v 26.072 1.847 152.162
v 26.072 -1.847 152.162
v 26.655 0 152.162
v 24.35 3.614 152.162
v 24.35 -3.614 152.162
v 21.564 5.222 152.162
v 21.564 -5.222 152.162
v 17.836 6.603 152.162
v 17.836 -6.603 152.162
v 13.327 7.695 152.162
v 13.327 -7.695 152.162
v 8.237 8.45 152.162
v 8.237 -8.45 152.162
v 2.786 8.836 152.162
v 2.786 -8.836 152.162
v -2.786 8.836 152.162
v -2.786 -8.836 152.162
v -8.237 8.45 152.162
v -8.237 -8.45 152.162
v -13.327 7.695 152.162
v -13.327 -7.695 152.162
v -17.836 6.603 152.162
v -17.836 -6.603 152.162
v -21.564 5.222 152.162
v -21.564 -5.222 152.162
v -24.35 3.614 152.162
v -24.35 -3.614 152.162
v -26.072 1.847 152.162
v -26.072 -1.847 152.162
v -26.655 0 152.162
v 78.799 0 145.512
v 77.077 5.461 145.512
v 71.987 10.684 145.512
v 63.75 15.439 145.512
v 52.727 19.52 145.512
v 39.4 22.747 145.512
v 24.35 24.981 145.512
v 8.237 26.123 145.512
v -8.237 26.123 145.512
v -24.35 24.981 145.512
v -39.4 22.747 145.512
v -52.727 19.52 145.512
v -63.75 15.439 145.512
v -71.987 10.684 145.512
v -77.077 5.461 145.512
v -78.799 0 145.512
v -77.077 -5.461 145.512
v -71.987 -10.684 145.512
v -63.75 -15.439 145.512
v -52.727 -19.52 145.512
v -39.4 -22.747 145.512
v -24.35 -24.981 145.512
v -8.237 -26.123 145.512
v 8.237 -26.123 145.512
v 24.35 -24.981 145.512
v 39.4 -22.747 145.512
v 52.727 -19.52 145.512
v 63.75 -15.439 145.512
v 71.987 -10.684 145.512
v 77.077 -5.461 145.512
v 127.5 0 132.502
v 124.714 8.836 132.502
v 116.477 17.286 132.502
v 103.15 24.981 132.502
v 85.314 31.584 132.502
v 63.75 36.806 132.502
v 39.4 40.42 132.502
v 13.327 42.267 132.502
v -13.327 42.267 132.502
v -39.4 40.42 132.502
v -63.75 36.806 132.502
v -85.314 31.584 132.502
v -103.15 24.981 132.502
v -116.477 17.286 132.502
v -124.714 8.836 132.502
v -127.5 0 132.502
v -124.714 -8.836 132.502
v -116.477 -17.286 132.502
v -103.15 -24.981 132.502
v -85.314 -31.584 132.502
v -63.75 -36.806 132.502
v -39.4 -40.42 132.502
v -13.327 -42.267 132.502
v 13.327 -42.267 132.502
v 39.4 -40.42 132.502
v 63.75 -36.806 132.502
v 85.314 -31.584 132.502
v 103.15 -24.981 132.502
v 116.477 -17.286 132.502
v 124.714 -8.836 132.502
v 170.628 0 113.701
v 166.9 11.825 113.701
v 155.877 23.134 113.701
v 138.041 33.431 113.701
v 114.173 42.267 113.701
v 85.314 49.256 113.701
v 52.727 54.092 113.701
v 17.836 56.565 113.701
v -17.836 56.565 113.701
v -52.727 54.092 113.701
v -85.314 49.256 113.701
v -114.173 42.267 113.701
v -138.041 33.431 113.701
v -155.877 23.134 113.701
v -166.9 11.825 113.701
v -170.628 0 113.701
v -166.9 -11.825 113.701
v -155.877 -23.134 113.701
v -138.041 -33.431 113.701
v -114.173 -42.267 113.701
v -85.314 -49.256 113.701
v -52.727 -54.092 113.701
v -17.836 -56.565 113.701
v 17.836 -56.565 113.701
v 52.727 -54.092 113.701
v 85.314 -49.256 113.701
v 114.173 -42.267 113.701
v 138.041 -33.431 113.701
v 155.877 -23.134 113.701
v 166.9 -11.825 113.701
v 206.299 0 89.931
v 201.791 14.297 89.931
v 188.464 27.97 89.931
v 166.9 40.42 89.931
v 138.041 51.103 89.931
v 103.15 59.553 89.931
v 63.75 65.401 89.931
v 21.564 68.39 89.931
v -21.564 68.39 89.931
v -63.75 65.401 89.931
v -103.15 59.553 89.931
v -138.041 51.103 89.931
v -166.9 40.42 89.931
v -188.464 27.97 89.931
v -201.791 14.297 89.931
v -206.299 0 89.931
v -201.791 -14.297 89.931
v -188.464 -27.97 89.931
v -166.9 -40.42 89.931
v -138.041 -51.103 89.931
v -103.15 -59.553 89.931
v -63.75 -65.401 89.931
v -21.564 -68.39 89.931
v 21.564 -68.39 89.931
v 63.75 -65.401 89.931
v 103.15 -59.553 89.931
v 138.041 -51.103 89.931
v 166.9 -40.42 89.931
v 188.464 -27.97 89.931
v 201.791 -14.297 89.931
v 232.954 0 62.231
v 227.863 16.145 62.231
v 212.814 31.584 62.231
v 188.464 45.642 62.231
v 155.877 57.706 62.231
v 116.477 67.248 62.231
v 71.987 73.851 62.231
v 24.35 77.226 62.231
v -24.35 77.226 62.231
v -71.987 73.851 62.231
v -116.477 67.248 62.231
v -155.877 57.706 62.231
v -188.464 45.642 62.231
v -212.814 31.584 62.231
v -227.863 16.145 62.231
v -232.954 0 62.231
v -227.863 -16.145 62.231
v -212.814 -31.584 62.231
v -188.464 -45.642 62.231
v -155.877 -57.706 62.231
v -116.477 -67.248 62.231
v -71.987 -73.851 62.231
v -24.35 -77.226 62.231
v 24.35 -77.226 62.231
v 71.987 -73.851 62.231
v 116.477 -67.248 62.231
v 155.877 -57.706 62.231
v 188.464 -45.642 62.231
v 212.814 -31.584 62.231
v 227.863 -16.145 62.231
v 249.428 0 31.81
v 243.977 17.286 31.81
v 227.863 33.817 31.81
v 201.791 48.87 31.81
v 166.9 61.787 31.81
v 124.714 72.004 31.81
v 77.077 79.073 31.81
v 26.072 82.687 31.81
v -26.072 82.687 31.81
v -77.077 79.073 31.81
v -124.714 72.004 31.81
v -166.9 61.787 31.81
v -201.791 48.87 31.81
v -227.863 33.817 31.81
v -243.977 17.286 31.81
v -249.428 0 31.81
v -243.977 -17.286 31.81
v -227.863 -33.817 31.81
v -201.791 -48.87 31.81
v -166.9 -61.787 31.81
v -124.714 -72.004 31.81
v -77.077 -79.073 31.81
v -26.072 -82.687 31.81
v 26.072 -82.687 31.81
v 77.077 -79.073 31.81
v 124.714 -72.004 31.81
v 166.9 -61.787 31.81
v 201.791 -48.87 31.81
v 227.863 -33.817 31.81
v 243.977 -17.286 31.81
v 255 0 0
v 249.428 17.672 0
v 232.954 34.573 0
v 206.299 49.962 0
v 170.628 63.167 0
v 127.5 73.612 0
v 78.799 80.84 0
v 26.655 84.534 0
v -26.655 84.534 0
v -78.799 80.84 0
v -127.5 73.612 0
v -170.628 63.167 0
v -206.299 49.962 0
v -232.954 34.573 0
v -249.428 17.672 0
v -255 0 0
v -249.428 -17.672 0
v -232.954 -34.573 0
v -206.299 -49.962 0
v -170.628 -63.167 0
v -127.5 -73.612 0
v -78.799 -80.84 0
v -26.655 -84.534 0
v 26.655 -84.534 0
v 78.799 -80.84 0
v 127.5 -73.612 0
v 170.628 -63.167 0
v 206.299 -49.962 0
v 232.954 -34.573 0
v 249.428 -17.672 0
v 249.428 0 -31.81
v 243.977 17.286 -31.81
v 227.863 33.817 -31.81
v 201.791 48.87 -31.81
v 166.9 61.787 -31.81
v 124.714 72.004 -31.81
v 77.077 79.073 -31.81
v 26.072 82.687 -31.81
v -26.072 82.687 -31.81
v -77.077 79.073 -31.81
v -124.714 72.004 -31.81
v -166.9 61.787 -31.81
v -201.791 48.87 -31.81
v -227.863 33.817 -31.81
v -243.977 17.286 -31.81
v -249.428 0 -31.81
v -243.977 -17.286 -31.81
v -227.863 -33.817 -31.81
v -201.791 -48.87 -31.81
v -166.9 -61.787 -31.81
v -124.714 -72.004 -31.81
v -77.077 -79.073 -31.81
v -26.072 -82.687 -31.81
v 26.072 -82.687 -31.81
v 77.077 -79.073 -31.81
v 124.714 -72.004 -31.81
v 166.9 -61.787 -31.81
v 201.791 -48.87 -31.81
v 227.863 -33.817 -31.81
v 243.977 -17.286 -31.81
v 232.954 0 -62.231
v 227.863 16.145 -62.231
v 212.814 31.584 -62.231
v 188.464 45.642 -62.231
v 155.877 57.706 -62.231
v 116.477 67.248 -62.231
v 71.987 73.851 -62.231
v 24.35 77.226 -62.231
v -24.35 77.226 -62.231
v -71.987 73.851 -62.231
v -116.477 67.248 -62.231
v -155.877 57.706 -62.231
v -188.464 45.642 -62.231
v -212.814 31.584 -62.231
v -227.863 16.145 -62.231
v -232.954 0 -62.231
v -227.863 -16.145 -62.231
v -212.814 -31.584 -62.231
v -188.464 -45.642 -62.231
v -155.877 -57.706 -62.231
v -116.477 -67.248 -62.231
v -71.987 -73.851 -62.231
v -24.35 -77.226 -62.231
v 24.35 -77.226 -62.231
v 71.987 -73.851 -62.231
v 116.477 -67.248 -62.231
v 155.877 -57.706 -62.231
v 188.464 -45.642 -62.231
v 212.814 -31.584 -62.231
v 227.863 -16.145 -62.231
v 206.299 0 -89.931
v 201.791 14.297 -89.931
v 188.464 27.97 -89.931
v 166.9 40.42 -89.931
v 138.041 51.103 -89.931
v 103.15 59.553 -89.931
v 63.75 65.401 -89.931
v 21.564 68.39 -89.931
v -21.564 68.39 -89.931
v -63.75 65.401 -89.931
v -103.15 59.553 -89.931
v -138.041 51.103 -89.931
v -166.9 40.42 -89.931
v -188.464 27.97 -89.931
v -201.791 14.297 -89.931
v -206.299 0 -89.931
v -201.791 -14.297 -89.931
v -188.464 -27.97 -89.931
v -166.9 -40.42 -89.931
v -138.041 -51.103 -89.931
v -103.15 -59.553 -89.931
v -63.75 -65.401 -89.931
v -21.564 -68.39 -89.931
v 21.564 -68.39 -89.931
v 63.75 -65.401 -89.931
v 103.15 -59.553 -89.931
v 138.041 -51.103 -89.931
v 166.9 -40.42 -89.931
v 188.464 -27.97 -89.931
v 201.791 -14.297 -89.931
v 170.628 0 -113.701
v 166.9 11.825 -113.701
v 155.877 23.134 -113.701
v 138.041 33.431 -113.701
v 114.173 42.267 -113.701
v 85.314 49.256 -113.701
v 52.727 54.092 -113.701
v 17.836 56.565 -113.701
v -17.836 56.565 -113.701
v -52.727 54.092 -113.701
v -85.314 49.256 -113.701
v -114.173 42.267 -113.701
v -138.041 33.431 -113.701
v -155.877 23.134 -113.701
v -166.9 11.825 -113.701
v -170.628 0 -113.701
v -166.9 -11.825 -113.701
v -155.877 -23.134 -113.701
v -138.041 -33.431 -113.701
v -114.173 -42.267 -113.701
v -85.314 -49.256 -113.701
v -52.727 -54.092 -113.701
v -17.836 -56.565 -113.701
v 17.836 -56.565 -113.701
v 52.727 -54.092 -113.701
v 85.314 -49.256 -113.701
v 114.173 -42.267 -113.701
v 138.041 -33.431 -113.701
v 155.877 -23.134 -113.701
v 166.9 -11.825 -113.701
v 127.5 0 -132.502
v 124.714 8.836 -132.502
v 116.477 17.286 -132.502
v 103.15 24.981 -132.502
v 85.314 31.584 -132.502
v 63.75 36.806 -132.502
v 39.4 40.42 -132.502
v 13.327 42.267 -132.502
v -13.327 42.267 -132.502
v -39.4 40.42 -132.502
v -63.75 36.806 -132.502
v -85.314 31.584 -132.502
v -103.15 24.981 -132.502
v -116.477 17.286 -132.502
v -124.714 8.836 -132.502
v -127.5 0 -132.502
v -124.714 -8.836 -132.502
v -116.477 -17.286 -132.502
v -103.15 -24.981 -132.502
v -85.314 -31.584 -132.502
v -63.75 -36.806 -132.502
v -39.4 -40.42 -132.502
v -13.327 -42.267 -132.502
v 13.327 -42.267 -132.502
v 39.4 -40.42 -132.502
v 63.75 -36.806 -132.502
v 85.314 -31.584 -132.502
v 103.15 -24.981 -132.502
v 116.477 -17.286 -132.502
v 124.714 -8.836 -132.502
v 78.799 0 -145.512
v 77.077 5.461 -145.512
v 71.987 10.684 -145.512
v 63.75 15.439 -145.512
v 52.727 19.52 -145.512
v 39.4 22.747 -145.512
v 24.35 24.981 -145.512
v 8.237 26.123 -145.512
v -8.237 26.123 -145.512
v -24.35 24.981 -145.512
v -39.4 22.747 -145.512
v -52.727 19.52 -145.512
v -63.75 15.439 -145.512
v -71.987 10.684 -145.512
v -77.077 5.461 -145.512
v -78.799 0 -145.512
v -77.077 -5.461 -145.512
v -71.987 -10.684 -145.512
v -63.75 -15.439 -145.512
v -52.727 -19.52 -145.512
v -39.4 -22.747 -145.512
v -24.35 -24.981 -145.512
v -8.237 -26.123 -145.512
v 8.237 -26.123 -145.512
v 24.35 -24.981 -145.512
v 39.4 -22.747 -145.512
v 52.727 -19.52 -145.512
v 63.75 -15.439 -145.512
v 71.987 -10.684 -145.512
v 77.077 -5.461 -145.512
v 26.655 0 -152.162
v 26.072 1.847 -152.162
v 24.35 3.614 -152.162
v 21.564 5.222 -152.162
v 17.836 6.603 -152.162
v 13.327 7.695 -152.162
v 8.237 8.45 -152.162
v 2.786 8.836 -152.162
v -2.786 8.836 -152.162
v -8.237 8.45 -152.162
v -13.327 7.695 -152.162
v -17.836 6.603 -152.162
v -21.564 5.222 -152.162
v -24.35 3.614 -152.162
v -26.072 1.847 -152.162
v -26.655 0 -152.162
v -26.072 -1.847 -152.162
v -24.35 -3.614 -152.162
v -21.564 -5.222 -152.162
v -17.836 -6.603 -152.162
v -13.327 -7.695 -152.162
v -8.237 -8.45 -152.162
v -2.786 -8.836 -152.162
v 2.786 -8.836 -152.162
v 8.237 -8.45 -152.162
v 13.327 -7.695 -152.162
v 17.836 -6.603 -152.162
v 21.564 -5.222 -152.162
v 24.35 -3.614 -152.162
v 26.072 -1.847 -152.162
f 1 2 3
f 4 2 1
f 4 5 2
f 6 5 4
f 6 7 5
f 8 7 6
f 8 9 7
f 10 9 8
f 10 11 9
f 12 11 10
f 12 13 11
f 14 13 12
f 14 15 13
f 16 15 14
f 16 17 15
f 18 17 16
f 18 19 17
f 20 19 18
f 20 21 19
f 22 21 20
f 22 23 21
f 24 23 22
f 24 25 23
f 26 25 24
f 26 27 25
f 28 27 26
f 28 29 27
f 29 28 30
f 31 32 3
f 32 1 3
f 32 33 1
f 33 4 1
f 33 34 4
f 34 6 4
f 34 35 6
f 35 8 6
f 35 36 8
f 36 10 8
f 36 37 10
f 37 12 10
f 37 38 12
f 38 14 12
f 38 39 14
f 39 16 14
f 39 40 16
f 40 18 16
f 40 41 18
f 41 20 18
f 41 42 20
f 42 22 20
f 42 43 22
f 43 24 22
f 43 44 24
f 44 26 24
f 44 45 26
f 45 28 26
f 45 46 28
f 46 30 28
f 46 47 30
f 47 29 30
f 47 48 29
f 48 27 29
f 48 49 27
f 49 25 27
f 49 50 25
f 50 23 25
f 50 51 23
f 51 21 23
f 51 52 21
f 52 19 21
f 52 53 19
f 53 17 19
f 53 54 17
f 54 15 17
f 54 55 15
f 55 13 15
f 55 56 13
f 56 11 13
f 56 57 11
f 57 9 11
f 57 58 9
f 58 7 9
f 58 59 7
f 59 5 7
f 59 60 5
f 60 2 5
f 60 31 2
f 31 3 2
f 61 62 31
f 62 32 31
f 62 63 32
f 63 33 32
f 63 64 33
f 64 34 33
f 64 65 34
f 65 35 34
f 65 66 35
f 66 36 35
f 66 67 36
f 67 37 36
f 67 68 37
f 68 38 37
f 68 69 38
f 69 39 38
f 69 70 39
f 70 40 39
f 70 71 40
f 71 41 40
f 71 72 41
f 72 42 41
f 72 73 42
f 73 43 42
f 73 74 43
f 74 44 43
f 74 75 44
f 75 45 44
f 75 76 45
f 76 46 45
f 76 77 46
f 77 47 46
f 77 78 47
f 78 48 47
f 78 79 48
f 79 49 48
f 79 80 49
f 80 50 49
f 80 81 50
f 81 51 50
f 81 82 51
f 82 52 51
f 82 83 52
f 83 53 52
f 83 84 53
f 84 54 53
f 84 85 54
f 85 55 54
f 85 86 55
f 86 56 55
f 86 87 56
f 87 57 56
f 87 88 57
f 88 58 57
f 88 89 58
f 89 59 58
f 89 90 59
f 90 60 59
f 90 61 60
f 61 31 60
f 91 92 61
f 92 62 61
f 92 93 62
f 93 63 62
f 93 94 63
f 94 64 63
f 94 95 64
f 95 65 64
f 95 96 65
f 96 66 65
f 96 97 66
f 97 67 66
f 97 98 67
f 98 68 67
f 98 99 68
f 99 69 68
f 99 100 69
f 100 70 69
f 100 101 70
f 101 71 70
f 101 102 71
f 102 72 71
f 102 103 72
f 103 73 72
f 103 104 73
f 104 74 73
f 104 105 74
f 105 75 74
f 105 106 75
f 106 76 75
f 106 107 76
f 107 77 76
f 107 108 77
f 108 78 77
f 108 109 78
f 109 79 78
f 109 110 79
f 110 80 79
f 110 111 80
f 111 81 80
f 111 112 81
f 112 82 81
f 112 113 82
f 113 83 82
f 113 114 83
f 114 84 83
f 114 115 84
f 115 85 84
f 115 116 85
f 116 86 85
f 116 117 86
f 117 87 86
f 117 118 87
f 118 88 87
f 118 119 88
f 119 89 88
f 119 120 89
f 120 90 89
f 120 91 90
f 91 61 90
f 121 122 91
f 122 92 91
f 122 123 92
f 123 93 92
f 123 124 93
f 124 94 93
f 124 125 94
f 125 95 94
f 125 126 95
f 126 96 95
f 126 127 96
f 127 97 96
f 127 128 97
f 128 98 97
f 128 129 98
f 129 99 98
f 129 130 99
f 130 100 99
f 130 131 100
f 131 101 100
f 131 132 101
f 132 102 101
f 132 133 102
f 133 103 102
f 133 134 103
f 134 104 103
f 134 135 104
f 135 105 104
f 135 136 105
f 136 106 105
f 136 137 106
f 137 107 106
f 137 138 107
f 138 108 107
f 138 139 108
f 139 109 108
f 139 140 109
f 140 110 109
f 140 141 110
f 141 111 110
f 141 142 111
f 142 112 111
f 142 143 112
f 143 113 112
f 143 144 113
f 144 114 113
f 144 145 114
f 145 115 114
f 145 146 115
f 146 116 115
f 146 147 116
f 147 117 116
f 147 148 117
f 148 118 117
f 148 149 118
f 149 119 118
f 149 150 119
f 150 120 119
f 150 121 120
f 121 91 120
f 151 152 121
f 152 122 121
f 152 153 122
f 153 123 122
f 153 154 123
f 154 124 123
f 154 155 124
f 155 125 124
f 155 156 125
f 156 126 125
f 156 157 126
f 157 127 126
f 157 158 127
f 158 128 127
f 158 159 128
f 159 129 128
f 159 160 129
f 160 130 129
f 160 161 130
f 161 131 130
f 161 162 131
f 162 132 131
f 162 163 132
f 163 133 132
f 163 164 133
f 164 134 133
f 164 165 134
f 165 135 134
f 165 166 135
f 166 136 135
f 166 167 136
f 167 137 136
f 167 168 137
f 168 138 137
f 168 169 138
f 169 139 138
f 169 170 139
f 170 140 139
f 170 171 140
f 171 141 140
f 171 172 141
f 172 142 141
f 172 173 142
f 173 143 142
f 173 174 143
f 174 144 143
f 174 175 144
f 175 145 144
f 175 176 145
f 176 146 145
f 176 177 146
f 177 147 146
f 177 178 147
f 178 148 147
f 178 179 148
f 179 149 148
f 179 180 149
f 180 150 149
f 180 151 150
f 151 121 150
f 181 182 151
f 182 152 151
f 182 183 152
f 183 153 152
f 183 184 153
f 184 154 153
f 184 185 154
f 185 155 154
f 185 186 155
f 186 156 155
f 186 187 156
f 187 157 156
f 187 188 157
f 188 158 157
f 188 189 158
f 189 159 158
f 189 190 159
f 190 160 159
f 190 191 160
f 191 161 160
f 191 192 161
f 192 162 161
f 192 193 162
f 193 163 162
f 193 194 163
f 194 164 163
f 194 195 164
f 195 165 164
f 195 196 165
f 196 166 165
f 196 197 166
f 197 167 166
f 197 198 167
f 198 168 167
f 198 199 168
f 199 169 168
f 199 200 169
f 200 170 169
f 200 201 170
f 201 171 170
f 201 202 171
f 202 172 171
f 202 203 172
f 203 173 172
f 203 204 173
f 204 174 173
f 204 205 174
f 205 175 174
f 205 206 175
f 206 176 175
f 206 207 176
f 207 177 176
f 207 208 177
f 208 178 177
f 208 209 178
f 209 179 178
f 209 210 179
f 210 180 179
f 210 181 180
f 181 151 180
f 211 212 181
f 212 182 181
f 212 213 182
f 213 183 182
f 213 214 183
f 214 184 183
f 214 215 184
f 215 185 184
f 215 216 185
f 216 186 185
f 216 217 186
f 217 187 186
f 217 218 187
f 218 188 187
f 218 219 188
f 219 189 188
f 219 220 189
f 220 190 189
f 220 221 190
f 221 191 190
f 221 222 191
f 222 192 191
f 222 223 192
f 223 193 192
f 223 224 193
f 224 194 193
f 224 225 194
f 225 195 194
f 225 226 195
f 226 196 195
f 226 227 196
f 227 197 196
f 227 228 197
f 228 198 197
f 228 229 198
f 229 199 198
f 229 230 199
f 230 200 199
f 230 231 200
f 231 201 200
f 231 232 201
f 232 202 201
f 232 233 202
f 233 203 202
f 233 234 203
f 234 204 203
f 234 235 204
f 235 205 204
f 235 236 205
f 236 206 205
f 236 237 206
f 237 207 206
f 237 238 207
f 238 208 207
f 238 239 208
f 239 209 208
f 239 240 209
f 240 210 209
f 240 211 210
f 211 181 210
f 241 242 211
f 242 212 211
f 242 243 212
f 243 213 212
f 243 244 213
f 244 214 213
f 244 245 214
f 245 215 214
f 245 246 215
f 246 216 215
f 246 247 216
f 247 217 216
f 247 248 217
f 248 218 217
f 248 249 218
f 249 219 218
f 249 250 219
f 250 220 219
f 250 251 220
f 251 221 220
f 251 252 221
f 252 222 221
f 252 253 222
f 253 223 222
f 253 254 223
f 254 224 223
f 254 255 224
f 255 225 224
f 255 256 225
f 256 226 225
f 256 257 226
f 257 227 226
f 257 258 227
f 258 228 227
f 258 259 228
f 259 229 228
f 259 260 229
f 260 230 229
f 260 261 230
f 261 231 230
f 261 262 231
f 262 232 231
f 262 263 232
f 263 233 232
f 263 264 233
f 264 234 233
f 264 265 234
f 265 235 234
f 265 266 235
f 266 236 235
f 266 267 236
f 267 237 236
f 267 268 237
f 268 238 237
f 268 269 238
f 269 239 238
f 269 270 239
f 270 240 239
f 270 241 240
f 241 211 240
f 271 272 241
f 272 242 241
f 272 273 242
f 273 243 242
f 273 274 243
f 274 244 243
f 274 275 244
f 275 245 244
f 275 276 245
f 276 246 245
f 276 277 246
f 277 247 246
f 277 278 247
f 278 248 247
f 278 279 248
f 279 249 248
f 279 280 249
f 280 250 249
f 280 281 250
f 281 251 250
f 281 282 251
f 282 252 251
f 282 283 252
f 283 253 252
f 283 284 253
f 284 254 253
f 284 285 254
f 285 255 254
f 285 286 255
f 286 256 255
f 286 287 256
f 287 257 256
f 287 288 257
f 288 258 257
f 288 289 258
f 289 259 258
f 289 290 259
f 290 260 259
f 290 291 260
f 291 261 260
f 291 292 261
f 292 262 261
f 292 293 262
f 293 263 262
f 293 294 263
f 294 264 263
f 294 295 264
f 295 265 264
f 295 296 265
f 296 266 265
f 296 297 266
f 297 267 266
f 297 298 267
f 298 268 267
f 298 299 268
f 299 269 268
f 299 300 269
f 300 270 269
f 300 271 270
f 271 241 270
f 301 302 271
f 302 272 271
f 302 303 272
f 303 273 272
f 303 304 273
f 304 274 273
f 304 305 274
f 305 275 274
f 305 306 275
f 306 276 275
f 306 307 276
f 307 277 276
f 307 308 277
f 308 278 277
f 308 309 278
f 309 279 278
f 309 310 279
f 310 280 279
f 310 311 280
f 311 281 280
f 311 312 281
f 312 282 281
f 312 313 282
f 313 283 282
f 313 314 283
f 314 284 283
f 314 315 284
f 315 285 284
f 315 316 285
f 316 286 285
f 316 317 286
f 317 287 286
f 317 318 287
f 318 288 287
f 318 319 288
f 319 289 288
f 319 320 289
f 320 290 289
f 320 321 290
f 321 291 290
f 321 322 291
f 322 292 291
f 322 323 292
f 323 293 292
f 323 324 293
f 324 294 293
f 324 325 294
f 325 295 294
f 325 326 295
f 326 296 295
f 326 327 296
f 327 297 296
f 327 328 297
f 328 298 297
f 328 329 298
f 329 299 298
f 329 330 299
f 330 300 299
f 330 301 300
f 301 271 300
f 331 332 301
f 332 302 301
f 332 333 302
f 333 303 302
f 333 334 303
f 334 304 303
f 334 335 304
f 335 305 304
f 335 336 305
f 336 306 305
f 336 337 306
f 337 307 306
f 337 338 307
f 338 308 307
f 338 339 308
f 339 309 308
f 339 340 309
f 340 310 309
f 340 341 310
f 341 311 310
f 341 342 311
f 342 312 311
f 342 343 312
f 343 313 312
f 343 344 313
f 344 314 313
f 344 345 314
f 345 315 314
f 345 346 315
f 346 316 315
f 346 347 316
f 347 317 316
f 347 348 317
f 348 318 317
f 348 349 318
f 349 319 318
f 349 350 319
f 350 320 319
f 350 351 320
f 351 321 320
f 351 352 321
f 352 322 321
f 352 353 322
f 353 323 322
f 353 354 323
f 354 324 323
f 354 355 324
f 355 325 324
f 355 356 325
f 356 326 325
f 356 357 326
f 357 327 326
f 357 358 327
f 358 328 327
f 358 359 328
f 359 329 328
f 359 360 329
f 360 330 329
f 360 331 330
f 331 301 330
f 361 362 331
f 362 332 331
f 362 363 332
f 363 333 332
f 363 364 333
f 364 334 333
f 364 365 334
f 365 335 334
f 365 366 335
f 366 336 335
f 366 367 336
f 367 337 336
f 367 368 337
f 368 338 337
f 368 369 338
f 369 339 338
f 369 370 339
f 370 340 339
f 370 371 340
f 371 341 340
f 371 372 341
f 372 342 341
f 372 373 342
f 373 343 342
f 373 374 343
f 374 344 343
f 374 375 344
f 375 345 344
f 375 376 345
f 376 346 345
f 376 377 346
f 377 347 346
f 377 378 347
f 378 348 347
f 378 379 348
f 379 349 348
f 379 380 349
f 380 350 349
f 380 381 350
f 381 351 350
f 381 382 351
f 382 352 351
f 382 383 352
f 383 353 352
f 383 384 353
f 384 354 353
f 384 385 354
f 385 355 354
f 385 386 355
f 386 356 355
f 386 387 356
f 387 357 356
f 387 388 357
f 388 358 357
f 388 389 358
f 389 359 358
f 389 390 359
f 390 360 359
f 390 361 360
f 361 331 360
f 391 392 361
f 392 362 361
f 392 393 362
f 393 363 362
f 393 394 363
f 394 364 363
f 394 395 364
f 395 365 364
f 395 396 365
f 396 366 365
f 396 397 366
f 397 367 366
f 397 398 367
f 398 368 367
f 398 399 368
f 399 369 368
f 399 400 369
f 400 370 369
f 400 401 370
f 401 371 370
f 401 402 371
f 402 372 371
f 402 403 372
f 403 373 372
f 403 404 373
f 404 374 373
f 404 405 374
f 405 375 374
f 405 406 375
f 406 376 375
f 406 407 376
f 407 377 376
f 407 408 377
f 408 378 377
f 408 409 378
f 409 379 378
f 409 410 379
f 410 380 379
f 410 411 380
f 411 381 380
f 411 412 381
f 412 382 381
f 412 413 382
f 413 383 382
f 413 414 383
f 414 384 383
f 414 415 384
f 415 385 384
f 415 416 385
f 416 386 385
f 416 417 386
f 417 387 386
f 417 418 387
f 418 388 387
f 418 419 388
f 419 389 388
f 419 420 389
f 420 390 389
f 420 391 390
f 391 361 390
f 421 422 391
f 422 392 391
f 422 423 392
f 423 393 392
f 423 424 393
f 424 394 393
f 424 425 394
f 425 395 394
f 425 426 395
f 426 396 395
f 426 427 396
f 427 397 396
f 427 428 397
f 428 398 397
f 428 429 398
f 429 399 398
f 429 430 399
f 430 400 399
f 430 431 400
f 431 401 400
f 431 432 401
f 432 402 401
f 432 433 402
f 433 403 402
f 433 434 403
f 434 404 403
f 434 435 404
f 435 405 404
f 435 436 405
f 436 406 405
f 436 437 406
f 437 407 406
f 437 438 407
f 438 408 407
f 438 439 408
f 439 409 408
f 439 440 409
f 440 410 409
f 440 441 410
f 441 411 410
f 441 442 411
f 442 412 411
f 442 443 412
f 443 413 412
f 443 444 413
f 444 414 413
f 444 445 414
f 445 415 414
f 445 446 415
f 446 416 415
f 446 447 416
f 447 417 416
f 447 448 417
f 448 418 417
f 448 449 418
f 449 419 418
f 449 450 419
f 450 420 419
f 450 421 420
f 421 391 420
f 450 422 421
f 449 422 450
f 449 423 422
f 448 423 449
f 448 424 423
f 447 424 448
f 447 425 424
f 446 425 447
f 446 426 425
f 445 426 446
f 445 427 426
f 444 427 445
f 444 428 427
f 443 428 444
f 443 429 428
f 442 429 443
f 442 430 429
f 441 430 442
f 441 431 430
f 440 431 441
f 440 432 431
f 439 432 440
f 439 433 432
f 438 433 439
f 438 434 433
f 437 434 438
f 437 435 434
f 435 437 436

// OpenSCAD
// Generated by SolidPython 1.0.1 on 2020-07-29 00:46:51


scale(v = [15, 5, 9]) {
	sphere(r = 17);
}
/***********************************************
*********      SolidPython code:      **********
************************************************
 
# import packages: SolidPython
from solid import *
from solid.utils import *
from itertools import chain, combinations, permutations


class Resize:

    def __init__(self, scad_file):
        self.scad_file = scad_file
        #self.scad_file = import_scad(scad_file)
        # cone/cylinder param:
        self.r1 = 0
        self.r2 = 0
        self.h = 0
        # rectangular prism param:
        self.w = 0
        self.l = 0
        # ellipse param:
        self.r = 0

    # import OpenScad code (file name corresponds to shape)


    # classify shape + parameters
    def assign(self, param1, param2, param3):
        if self.scad_file == 'cone.scad':
            self.r1 = param1
            self.r2 = param2
            self.h = param3
        elif self.scad_file == 'cylinder.scad':
            self.r1 = param1
            self.r2 = param2
            self.h = param3
        elif self.scad_file == 'rectangularPrism.scad':
            self.h = param1
            self.l = param2
            self.w = param3
        else:
            self.r = param1
            self.h = param2

    # resize parameters
    def iterate(self):
        x = range(3, 20, 2)
        i = 1
        if self.scad_file == 'cone.scad':
            tempList = list(permutations(x, 2))
            for temp in tempList:
                param1 = temp[0]
                param2 = temp[1]
                filepath = 'produced_scad_files/' + 'cone' + str(param1) + '_' + str(param2) + '_' + '.scad'
                scad_render_to_file(cylinder(h=param1, r1=param2, r2=0), filepath)

        elif self.scad_file == 'cylinder.scad':
            tempList = list(permutations(x, 3))
            for temp in tempList:
                param1 = temp[0]
                param2 = temp[1]
                filepath = 'produced_scad_files/' + 'cylinder' + str(param1) + '_' + str(param2) + '_' + '.scad'
                scad_render_to_file(cylinder(h=param1, r1=param2, r2=param2), filepath)

        elif self.scad_file == 'rectangularPrism.scad':
            tempList = list(permutations(x, 3))
            for temp in tempList:
                param1 = temp[0]
                param2 = temp[1]
                param3 = temp[2]
                filepath = 'produced_scad_files/' + 'rectangularPrism' + str(param1) + '_' + str(param2) + '_' + str(
                    param3) + '.scad'
                scad_render_to_file(cube(size=(param1, param2, param3)), filepath)

        elif self.scad_file == 'ellipse.scad':
            tempList = list(permutations(x, 4))
            for temp in tempList:
                param1 = temp[0]
                param2 = temp[1]
                param3 = temp[2]
                param4 = temp[3]
                filepath = 'produced_scad_files/' + 'ellipse' + str(param1) + '_' + str(param2) + '_' + str(param3) + '_' + str(param4) + '.scad'
                scad_render_to_file(scale([param1, param2, param3])(sphere(r=param4)), filepath)

    def render_to_scadfile(self):
        scad_render_to_file(scad, 'example.scad') 
 
************************************************/
